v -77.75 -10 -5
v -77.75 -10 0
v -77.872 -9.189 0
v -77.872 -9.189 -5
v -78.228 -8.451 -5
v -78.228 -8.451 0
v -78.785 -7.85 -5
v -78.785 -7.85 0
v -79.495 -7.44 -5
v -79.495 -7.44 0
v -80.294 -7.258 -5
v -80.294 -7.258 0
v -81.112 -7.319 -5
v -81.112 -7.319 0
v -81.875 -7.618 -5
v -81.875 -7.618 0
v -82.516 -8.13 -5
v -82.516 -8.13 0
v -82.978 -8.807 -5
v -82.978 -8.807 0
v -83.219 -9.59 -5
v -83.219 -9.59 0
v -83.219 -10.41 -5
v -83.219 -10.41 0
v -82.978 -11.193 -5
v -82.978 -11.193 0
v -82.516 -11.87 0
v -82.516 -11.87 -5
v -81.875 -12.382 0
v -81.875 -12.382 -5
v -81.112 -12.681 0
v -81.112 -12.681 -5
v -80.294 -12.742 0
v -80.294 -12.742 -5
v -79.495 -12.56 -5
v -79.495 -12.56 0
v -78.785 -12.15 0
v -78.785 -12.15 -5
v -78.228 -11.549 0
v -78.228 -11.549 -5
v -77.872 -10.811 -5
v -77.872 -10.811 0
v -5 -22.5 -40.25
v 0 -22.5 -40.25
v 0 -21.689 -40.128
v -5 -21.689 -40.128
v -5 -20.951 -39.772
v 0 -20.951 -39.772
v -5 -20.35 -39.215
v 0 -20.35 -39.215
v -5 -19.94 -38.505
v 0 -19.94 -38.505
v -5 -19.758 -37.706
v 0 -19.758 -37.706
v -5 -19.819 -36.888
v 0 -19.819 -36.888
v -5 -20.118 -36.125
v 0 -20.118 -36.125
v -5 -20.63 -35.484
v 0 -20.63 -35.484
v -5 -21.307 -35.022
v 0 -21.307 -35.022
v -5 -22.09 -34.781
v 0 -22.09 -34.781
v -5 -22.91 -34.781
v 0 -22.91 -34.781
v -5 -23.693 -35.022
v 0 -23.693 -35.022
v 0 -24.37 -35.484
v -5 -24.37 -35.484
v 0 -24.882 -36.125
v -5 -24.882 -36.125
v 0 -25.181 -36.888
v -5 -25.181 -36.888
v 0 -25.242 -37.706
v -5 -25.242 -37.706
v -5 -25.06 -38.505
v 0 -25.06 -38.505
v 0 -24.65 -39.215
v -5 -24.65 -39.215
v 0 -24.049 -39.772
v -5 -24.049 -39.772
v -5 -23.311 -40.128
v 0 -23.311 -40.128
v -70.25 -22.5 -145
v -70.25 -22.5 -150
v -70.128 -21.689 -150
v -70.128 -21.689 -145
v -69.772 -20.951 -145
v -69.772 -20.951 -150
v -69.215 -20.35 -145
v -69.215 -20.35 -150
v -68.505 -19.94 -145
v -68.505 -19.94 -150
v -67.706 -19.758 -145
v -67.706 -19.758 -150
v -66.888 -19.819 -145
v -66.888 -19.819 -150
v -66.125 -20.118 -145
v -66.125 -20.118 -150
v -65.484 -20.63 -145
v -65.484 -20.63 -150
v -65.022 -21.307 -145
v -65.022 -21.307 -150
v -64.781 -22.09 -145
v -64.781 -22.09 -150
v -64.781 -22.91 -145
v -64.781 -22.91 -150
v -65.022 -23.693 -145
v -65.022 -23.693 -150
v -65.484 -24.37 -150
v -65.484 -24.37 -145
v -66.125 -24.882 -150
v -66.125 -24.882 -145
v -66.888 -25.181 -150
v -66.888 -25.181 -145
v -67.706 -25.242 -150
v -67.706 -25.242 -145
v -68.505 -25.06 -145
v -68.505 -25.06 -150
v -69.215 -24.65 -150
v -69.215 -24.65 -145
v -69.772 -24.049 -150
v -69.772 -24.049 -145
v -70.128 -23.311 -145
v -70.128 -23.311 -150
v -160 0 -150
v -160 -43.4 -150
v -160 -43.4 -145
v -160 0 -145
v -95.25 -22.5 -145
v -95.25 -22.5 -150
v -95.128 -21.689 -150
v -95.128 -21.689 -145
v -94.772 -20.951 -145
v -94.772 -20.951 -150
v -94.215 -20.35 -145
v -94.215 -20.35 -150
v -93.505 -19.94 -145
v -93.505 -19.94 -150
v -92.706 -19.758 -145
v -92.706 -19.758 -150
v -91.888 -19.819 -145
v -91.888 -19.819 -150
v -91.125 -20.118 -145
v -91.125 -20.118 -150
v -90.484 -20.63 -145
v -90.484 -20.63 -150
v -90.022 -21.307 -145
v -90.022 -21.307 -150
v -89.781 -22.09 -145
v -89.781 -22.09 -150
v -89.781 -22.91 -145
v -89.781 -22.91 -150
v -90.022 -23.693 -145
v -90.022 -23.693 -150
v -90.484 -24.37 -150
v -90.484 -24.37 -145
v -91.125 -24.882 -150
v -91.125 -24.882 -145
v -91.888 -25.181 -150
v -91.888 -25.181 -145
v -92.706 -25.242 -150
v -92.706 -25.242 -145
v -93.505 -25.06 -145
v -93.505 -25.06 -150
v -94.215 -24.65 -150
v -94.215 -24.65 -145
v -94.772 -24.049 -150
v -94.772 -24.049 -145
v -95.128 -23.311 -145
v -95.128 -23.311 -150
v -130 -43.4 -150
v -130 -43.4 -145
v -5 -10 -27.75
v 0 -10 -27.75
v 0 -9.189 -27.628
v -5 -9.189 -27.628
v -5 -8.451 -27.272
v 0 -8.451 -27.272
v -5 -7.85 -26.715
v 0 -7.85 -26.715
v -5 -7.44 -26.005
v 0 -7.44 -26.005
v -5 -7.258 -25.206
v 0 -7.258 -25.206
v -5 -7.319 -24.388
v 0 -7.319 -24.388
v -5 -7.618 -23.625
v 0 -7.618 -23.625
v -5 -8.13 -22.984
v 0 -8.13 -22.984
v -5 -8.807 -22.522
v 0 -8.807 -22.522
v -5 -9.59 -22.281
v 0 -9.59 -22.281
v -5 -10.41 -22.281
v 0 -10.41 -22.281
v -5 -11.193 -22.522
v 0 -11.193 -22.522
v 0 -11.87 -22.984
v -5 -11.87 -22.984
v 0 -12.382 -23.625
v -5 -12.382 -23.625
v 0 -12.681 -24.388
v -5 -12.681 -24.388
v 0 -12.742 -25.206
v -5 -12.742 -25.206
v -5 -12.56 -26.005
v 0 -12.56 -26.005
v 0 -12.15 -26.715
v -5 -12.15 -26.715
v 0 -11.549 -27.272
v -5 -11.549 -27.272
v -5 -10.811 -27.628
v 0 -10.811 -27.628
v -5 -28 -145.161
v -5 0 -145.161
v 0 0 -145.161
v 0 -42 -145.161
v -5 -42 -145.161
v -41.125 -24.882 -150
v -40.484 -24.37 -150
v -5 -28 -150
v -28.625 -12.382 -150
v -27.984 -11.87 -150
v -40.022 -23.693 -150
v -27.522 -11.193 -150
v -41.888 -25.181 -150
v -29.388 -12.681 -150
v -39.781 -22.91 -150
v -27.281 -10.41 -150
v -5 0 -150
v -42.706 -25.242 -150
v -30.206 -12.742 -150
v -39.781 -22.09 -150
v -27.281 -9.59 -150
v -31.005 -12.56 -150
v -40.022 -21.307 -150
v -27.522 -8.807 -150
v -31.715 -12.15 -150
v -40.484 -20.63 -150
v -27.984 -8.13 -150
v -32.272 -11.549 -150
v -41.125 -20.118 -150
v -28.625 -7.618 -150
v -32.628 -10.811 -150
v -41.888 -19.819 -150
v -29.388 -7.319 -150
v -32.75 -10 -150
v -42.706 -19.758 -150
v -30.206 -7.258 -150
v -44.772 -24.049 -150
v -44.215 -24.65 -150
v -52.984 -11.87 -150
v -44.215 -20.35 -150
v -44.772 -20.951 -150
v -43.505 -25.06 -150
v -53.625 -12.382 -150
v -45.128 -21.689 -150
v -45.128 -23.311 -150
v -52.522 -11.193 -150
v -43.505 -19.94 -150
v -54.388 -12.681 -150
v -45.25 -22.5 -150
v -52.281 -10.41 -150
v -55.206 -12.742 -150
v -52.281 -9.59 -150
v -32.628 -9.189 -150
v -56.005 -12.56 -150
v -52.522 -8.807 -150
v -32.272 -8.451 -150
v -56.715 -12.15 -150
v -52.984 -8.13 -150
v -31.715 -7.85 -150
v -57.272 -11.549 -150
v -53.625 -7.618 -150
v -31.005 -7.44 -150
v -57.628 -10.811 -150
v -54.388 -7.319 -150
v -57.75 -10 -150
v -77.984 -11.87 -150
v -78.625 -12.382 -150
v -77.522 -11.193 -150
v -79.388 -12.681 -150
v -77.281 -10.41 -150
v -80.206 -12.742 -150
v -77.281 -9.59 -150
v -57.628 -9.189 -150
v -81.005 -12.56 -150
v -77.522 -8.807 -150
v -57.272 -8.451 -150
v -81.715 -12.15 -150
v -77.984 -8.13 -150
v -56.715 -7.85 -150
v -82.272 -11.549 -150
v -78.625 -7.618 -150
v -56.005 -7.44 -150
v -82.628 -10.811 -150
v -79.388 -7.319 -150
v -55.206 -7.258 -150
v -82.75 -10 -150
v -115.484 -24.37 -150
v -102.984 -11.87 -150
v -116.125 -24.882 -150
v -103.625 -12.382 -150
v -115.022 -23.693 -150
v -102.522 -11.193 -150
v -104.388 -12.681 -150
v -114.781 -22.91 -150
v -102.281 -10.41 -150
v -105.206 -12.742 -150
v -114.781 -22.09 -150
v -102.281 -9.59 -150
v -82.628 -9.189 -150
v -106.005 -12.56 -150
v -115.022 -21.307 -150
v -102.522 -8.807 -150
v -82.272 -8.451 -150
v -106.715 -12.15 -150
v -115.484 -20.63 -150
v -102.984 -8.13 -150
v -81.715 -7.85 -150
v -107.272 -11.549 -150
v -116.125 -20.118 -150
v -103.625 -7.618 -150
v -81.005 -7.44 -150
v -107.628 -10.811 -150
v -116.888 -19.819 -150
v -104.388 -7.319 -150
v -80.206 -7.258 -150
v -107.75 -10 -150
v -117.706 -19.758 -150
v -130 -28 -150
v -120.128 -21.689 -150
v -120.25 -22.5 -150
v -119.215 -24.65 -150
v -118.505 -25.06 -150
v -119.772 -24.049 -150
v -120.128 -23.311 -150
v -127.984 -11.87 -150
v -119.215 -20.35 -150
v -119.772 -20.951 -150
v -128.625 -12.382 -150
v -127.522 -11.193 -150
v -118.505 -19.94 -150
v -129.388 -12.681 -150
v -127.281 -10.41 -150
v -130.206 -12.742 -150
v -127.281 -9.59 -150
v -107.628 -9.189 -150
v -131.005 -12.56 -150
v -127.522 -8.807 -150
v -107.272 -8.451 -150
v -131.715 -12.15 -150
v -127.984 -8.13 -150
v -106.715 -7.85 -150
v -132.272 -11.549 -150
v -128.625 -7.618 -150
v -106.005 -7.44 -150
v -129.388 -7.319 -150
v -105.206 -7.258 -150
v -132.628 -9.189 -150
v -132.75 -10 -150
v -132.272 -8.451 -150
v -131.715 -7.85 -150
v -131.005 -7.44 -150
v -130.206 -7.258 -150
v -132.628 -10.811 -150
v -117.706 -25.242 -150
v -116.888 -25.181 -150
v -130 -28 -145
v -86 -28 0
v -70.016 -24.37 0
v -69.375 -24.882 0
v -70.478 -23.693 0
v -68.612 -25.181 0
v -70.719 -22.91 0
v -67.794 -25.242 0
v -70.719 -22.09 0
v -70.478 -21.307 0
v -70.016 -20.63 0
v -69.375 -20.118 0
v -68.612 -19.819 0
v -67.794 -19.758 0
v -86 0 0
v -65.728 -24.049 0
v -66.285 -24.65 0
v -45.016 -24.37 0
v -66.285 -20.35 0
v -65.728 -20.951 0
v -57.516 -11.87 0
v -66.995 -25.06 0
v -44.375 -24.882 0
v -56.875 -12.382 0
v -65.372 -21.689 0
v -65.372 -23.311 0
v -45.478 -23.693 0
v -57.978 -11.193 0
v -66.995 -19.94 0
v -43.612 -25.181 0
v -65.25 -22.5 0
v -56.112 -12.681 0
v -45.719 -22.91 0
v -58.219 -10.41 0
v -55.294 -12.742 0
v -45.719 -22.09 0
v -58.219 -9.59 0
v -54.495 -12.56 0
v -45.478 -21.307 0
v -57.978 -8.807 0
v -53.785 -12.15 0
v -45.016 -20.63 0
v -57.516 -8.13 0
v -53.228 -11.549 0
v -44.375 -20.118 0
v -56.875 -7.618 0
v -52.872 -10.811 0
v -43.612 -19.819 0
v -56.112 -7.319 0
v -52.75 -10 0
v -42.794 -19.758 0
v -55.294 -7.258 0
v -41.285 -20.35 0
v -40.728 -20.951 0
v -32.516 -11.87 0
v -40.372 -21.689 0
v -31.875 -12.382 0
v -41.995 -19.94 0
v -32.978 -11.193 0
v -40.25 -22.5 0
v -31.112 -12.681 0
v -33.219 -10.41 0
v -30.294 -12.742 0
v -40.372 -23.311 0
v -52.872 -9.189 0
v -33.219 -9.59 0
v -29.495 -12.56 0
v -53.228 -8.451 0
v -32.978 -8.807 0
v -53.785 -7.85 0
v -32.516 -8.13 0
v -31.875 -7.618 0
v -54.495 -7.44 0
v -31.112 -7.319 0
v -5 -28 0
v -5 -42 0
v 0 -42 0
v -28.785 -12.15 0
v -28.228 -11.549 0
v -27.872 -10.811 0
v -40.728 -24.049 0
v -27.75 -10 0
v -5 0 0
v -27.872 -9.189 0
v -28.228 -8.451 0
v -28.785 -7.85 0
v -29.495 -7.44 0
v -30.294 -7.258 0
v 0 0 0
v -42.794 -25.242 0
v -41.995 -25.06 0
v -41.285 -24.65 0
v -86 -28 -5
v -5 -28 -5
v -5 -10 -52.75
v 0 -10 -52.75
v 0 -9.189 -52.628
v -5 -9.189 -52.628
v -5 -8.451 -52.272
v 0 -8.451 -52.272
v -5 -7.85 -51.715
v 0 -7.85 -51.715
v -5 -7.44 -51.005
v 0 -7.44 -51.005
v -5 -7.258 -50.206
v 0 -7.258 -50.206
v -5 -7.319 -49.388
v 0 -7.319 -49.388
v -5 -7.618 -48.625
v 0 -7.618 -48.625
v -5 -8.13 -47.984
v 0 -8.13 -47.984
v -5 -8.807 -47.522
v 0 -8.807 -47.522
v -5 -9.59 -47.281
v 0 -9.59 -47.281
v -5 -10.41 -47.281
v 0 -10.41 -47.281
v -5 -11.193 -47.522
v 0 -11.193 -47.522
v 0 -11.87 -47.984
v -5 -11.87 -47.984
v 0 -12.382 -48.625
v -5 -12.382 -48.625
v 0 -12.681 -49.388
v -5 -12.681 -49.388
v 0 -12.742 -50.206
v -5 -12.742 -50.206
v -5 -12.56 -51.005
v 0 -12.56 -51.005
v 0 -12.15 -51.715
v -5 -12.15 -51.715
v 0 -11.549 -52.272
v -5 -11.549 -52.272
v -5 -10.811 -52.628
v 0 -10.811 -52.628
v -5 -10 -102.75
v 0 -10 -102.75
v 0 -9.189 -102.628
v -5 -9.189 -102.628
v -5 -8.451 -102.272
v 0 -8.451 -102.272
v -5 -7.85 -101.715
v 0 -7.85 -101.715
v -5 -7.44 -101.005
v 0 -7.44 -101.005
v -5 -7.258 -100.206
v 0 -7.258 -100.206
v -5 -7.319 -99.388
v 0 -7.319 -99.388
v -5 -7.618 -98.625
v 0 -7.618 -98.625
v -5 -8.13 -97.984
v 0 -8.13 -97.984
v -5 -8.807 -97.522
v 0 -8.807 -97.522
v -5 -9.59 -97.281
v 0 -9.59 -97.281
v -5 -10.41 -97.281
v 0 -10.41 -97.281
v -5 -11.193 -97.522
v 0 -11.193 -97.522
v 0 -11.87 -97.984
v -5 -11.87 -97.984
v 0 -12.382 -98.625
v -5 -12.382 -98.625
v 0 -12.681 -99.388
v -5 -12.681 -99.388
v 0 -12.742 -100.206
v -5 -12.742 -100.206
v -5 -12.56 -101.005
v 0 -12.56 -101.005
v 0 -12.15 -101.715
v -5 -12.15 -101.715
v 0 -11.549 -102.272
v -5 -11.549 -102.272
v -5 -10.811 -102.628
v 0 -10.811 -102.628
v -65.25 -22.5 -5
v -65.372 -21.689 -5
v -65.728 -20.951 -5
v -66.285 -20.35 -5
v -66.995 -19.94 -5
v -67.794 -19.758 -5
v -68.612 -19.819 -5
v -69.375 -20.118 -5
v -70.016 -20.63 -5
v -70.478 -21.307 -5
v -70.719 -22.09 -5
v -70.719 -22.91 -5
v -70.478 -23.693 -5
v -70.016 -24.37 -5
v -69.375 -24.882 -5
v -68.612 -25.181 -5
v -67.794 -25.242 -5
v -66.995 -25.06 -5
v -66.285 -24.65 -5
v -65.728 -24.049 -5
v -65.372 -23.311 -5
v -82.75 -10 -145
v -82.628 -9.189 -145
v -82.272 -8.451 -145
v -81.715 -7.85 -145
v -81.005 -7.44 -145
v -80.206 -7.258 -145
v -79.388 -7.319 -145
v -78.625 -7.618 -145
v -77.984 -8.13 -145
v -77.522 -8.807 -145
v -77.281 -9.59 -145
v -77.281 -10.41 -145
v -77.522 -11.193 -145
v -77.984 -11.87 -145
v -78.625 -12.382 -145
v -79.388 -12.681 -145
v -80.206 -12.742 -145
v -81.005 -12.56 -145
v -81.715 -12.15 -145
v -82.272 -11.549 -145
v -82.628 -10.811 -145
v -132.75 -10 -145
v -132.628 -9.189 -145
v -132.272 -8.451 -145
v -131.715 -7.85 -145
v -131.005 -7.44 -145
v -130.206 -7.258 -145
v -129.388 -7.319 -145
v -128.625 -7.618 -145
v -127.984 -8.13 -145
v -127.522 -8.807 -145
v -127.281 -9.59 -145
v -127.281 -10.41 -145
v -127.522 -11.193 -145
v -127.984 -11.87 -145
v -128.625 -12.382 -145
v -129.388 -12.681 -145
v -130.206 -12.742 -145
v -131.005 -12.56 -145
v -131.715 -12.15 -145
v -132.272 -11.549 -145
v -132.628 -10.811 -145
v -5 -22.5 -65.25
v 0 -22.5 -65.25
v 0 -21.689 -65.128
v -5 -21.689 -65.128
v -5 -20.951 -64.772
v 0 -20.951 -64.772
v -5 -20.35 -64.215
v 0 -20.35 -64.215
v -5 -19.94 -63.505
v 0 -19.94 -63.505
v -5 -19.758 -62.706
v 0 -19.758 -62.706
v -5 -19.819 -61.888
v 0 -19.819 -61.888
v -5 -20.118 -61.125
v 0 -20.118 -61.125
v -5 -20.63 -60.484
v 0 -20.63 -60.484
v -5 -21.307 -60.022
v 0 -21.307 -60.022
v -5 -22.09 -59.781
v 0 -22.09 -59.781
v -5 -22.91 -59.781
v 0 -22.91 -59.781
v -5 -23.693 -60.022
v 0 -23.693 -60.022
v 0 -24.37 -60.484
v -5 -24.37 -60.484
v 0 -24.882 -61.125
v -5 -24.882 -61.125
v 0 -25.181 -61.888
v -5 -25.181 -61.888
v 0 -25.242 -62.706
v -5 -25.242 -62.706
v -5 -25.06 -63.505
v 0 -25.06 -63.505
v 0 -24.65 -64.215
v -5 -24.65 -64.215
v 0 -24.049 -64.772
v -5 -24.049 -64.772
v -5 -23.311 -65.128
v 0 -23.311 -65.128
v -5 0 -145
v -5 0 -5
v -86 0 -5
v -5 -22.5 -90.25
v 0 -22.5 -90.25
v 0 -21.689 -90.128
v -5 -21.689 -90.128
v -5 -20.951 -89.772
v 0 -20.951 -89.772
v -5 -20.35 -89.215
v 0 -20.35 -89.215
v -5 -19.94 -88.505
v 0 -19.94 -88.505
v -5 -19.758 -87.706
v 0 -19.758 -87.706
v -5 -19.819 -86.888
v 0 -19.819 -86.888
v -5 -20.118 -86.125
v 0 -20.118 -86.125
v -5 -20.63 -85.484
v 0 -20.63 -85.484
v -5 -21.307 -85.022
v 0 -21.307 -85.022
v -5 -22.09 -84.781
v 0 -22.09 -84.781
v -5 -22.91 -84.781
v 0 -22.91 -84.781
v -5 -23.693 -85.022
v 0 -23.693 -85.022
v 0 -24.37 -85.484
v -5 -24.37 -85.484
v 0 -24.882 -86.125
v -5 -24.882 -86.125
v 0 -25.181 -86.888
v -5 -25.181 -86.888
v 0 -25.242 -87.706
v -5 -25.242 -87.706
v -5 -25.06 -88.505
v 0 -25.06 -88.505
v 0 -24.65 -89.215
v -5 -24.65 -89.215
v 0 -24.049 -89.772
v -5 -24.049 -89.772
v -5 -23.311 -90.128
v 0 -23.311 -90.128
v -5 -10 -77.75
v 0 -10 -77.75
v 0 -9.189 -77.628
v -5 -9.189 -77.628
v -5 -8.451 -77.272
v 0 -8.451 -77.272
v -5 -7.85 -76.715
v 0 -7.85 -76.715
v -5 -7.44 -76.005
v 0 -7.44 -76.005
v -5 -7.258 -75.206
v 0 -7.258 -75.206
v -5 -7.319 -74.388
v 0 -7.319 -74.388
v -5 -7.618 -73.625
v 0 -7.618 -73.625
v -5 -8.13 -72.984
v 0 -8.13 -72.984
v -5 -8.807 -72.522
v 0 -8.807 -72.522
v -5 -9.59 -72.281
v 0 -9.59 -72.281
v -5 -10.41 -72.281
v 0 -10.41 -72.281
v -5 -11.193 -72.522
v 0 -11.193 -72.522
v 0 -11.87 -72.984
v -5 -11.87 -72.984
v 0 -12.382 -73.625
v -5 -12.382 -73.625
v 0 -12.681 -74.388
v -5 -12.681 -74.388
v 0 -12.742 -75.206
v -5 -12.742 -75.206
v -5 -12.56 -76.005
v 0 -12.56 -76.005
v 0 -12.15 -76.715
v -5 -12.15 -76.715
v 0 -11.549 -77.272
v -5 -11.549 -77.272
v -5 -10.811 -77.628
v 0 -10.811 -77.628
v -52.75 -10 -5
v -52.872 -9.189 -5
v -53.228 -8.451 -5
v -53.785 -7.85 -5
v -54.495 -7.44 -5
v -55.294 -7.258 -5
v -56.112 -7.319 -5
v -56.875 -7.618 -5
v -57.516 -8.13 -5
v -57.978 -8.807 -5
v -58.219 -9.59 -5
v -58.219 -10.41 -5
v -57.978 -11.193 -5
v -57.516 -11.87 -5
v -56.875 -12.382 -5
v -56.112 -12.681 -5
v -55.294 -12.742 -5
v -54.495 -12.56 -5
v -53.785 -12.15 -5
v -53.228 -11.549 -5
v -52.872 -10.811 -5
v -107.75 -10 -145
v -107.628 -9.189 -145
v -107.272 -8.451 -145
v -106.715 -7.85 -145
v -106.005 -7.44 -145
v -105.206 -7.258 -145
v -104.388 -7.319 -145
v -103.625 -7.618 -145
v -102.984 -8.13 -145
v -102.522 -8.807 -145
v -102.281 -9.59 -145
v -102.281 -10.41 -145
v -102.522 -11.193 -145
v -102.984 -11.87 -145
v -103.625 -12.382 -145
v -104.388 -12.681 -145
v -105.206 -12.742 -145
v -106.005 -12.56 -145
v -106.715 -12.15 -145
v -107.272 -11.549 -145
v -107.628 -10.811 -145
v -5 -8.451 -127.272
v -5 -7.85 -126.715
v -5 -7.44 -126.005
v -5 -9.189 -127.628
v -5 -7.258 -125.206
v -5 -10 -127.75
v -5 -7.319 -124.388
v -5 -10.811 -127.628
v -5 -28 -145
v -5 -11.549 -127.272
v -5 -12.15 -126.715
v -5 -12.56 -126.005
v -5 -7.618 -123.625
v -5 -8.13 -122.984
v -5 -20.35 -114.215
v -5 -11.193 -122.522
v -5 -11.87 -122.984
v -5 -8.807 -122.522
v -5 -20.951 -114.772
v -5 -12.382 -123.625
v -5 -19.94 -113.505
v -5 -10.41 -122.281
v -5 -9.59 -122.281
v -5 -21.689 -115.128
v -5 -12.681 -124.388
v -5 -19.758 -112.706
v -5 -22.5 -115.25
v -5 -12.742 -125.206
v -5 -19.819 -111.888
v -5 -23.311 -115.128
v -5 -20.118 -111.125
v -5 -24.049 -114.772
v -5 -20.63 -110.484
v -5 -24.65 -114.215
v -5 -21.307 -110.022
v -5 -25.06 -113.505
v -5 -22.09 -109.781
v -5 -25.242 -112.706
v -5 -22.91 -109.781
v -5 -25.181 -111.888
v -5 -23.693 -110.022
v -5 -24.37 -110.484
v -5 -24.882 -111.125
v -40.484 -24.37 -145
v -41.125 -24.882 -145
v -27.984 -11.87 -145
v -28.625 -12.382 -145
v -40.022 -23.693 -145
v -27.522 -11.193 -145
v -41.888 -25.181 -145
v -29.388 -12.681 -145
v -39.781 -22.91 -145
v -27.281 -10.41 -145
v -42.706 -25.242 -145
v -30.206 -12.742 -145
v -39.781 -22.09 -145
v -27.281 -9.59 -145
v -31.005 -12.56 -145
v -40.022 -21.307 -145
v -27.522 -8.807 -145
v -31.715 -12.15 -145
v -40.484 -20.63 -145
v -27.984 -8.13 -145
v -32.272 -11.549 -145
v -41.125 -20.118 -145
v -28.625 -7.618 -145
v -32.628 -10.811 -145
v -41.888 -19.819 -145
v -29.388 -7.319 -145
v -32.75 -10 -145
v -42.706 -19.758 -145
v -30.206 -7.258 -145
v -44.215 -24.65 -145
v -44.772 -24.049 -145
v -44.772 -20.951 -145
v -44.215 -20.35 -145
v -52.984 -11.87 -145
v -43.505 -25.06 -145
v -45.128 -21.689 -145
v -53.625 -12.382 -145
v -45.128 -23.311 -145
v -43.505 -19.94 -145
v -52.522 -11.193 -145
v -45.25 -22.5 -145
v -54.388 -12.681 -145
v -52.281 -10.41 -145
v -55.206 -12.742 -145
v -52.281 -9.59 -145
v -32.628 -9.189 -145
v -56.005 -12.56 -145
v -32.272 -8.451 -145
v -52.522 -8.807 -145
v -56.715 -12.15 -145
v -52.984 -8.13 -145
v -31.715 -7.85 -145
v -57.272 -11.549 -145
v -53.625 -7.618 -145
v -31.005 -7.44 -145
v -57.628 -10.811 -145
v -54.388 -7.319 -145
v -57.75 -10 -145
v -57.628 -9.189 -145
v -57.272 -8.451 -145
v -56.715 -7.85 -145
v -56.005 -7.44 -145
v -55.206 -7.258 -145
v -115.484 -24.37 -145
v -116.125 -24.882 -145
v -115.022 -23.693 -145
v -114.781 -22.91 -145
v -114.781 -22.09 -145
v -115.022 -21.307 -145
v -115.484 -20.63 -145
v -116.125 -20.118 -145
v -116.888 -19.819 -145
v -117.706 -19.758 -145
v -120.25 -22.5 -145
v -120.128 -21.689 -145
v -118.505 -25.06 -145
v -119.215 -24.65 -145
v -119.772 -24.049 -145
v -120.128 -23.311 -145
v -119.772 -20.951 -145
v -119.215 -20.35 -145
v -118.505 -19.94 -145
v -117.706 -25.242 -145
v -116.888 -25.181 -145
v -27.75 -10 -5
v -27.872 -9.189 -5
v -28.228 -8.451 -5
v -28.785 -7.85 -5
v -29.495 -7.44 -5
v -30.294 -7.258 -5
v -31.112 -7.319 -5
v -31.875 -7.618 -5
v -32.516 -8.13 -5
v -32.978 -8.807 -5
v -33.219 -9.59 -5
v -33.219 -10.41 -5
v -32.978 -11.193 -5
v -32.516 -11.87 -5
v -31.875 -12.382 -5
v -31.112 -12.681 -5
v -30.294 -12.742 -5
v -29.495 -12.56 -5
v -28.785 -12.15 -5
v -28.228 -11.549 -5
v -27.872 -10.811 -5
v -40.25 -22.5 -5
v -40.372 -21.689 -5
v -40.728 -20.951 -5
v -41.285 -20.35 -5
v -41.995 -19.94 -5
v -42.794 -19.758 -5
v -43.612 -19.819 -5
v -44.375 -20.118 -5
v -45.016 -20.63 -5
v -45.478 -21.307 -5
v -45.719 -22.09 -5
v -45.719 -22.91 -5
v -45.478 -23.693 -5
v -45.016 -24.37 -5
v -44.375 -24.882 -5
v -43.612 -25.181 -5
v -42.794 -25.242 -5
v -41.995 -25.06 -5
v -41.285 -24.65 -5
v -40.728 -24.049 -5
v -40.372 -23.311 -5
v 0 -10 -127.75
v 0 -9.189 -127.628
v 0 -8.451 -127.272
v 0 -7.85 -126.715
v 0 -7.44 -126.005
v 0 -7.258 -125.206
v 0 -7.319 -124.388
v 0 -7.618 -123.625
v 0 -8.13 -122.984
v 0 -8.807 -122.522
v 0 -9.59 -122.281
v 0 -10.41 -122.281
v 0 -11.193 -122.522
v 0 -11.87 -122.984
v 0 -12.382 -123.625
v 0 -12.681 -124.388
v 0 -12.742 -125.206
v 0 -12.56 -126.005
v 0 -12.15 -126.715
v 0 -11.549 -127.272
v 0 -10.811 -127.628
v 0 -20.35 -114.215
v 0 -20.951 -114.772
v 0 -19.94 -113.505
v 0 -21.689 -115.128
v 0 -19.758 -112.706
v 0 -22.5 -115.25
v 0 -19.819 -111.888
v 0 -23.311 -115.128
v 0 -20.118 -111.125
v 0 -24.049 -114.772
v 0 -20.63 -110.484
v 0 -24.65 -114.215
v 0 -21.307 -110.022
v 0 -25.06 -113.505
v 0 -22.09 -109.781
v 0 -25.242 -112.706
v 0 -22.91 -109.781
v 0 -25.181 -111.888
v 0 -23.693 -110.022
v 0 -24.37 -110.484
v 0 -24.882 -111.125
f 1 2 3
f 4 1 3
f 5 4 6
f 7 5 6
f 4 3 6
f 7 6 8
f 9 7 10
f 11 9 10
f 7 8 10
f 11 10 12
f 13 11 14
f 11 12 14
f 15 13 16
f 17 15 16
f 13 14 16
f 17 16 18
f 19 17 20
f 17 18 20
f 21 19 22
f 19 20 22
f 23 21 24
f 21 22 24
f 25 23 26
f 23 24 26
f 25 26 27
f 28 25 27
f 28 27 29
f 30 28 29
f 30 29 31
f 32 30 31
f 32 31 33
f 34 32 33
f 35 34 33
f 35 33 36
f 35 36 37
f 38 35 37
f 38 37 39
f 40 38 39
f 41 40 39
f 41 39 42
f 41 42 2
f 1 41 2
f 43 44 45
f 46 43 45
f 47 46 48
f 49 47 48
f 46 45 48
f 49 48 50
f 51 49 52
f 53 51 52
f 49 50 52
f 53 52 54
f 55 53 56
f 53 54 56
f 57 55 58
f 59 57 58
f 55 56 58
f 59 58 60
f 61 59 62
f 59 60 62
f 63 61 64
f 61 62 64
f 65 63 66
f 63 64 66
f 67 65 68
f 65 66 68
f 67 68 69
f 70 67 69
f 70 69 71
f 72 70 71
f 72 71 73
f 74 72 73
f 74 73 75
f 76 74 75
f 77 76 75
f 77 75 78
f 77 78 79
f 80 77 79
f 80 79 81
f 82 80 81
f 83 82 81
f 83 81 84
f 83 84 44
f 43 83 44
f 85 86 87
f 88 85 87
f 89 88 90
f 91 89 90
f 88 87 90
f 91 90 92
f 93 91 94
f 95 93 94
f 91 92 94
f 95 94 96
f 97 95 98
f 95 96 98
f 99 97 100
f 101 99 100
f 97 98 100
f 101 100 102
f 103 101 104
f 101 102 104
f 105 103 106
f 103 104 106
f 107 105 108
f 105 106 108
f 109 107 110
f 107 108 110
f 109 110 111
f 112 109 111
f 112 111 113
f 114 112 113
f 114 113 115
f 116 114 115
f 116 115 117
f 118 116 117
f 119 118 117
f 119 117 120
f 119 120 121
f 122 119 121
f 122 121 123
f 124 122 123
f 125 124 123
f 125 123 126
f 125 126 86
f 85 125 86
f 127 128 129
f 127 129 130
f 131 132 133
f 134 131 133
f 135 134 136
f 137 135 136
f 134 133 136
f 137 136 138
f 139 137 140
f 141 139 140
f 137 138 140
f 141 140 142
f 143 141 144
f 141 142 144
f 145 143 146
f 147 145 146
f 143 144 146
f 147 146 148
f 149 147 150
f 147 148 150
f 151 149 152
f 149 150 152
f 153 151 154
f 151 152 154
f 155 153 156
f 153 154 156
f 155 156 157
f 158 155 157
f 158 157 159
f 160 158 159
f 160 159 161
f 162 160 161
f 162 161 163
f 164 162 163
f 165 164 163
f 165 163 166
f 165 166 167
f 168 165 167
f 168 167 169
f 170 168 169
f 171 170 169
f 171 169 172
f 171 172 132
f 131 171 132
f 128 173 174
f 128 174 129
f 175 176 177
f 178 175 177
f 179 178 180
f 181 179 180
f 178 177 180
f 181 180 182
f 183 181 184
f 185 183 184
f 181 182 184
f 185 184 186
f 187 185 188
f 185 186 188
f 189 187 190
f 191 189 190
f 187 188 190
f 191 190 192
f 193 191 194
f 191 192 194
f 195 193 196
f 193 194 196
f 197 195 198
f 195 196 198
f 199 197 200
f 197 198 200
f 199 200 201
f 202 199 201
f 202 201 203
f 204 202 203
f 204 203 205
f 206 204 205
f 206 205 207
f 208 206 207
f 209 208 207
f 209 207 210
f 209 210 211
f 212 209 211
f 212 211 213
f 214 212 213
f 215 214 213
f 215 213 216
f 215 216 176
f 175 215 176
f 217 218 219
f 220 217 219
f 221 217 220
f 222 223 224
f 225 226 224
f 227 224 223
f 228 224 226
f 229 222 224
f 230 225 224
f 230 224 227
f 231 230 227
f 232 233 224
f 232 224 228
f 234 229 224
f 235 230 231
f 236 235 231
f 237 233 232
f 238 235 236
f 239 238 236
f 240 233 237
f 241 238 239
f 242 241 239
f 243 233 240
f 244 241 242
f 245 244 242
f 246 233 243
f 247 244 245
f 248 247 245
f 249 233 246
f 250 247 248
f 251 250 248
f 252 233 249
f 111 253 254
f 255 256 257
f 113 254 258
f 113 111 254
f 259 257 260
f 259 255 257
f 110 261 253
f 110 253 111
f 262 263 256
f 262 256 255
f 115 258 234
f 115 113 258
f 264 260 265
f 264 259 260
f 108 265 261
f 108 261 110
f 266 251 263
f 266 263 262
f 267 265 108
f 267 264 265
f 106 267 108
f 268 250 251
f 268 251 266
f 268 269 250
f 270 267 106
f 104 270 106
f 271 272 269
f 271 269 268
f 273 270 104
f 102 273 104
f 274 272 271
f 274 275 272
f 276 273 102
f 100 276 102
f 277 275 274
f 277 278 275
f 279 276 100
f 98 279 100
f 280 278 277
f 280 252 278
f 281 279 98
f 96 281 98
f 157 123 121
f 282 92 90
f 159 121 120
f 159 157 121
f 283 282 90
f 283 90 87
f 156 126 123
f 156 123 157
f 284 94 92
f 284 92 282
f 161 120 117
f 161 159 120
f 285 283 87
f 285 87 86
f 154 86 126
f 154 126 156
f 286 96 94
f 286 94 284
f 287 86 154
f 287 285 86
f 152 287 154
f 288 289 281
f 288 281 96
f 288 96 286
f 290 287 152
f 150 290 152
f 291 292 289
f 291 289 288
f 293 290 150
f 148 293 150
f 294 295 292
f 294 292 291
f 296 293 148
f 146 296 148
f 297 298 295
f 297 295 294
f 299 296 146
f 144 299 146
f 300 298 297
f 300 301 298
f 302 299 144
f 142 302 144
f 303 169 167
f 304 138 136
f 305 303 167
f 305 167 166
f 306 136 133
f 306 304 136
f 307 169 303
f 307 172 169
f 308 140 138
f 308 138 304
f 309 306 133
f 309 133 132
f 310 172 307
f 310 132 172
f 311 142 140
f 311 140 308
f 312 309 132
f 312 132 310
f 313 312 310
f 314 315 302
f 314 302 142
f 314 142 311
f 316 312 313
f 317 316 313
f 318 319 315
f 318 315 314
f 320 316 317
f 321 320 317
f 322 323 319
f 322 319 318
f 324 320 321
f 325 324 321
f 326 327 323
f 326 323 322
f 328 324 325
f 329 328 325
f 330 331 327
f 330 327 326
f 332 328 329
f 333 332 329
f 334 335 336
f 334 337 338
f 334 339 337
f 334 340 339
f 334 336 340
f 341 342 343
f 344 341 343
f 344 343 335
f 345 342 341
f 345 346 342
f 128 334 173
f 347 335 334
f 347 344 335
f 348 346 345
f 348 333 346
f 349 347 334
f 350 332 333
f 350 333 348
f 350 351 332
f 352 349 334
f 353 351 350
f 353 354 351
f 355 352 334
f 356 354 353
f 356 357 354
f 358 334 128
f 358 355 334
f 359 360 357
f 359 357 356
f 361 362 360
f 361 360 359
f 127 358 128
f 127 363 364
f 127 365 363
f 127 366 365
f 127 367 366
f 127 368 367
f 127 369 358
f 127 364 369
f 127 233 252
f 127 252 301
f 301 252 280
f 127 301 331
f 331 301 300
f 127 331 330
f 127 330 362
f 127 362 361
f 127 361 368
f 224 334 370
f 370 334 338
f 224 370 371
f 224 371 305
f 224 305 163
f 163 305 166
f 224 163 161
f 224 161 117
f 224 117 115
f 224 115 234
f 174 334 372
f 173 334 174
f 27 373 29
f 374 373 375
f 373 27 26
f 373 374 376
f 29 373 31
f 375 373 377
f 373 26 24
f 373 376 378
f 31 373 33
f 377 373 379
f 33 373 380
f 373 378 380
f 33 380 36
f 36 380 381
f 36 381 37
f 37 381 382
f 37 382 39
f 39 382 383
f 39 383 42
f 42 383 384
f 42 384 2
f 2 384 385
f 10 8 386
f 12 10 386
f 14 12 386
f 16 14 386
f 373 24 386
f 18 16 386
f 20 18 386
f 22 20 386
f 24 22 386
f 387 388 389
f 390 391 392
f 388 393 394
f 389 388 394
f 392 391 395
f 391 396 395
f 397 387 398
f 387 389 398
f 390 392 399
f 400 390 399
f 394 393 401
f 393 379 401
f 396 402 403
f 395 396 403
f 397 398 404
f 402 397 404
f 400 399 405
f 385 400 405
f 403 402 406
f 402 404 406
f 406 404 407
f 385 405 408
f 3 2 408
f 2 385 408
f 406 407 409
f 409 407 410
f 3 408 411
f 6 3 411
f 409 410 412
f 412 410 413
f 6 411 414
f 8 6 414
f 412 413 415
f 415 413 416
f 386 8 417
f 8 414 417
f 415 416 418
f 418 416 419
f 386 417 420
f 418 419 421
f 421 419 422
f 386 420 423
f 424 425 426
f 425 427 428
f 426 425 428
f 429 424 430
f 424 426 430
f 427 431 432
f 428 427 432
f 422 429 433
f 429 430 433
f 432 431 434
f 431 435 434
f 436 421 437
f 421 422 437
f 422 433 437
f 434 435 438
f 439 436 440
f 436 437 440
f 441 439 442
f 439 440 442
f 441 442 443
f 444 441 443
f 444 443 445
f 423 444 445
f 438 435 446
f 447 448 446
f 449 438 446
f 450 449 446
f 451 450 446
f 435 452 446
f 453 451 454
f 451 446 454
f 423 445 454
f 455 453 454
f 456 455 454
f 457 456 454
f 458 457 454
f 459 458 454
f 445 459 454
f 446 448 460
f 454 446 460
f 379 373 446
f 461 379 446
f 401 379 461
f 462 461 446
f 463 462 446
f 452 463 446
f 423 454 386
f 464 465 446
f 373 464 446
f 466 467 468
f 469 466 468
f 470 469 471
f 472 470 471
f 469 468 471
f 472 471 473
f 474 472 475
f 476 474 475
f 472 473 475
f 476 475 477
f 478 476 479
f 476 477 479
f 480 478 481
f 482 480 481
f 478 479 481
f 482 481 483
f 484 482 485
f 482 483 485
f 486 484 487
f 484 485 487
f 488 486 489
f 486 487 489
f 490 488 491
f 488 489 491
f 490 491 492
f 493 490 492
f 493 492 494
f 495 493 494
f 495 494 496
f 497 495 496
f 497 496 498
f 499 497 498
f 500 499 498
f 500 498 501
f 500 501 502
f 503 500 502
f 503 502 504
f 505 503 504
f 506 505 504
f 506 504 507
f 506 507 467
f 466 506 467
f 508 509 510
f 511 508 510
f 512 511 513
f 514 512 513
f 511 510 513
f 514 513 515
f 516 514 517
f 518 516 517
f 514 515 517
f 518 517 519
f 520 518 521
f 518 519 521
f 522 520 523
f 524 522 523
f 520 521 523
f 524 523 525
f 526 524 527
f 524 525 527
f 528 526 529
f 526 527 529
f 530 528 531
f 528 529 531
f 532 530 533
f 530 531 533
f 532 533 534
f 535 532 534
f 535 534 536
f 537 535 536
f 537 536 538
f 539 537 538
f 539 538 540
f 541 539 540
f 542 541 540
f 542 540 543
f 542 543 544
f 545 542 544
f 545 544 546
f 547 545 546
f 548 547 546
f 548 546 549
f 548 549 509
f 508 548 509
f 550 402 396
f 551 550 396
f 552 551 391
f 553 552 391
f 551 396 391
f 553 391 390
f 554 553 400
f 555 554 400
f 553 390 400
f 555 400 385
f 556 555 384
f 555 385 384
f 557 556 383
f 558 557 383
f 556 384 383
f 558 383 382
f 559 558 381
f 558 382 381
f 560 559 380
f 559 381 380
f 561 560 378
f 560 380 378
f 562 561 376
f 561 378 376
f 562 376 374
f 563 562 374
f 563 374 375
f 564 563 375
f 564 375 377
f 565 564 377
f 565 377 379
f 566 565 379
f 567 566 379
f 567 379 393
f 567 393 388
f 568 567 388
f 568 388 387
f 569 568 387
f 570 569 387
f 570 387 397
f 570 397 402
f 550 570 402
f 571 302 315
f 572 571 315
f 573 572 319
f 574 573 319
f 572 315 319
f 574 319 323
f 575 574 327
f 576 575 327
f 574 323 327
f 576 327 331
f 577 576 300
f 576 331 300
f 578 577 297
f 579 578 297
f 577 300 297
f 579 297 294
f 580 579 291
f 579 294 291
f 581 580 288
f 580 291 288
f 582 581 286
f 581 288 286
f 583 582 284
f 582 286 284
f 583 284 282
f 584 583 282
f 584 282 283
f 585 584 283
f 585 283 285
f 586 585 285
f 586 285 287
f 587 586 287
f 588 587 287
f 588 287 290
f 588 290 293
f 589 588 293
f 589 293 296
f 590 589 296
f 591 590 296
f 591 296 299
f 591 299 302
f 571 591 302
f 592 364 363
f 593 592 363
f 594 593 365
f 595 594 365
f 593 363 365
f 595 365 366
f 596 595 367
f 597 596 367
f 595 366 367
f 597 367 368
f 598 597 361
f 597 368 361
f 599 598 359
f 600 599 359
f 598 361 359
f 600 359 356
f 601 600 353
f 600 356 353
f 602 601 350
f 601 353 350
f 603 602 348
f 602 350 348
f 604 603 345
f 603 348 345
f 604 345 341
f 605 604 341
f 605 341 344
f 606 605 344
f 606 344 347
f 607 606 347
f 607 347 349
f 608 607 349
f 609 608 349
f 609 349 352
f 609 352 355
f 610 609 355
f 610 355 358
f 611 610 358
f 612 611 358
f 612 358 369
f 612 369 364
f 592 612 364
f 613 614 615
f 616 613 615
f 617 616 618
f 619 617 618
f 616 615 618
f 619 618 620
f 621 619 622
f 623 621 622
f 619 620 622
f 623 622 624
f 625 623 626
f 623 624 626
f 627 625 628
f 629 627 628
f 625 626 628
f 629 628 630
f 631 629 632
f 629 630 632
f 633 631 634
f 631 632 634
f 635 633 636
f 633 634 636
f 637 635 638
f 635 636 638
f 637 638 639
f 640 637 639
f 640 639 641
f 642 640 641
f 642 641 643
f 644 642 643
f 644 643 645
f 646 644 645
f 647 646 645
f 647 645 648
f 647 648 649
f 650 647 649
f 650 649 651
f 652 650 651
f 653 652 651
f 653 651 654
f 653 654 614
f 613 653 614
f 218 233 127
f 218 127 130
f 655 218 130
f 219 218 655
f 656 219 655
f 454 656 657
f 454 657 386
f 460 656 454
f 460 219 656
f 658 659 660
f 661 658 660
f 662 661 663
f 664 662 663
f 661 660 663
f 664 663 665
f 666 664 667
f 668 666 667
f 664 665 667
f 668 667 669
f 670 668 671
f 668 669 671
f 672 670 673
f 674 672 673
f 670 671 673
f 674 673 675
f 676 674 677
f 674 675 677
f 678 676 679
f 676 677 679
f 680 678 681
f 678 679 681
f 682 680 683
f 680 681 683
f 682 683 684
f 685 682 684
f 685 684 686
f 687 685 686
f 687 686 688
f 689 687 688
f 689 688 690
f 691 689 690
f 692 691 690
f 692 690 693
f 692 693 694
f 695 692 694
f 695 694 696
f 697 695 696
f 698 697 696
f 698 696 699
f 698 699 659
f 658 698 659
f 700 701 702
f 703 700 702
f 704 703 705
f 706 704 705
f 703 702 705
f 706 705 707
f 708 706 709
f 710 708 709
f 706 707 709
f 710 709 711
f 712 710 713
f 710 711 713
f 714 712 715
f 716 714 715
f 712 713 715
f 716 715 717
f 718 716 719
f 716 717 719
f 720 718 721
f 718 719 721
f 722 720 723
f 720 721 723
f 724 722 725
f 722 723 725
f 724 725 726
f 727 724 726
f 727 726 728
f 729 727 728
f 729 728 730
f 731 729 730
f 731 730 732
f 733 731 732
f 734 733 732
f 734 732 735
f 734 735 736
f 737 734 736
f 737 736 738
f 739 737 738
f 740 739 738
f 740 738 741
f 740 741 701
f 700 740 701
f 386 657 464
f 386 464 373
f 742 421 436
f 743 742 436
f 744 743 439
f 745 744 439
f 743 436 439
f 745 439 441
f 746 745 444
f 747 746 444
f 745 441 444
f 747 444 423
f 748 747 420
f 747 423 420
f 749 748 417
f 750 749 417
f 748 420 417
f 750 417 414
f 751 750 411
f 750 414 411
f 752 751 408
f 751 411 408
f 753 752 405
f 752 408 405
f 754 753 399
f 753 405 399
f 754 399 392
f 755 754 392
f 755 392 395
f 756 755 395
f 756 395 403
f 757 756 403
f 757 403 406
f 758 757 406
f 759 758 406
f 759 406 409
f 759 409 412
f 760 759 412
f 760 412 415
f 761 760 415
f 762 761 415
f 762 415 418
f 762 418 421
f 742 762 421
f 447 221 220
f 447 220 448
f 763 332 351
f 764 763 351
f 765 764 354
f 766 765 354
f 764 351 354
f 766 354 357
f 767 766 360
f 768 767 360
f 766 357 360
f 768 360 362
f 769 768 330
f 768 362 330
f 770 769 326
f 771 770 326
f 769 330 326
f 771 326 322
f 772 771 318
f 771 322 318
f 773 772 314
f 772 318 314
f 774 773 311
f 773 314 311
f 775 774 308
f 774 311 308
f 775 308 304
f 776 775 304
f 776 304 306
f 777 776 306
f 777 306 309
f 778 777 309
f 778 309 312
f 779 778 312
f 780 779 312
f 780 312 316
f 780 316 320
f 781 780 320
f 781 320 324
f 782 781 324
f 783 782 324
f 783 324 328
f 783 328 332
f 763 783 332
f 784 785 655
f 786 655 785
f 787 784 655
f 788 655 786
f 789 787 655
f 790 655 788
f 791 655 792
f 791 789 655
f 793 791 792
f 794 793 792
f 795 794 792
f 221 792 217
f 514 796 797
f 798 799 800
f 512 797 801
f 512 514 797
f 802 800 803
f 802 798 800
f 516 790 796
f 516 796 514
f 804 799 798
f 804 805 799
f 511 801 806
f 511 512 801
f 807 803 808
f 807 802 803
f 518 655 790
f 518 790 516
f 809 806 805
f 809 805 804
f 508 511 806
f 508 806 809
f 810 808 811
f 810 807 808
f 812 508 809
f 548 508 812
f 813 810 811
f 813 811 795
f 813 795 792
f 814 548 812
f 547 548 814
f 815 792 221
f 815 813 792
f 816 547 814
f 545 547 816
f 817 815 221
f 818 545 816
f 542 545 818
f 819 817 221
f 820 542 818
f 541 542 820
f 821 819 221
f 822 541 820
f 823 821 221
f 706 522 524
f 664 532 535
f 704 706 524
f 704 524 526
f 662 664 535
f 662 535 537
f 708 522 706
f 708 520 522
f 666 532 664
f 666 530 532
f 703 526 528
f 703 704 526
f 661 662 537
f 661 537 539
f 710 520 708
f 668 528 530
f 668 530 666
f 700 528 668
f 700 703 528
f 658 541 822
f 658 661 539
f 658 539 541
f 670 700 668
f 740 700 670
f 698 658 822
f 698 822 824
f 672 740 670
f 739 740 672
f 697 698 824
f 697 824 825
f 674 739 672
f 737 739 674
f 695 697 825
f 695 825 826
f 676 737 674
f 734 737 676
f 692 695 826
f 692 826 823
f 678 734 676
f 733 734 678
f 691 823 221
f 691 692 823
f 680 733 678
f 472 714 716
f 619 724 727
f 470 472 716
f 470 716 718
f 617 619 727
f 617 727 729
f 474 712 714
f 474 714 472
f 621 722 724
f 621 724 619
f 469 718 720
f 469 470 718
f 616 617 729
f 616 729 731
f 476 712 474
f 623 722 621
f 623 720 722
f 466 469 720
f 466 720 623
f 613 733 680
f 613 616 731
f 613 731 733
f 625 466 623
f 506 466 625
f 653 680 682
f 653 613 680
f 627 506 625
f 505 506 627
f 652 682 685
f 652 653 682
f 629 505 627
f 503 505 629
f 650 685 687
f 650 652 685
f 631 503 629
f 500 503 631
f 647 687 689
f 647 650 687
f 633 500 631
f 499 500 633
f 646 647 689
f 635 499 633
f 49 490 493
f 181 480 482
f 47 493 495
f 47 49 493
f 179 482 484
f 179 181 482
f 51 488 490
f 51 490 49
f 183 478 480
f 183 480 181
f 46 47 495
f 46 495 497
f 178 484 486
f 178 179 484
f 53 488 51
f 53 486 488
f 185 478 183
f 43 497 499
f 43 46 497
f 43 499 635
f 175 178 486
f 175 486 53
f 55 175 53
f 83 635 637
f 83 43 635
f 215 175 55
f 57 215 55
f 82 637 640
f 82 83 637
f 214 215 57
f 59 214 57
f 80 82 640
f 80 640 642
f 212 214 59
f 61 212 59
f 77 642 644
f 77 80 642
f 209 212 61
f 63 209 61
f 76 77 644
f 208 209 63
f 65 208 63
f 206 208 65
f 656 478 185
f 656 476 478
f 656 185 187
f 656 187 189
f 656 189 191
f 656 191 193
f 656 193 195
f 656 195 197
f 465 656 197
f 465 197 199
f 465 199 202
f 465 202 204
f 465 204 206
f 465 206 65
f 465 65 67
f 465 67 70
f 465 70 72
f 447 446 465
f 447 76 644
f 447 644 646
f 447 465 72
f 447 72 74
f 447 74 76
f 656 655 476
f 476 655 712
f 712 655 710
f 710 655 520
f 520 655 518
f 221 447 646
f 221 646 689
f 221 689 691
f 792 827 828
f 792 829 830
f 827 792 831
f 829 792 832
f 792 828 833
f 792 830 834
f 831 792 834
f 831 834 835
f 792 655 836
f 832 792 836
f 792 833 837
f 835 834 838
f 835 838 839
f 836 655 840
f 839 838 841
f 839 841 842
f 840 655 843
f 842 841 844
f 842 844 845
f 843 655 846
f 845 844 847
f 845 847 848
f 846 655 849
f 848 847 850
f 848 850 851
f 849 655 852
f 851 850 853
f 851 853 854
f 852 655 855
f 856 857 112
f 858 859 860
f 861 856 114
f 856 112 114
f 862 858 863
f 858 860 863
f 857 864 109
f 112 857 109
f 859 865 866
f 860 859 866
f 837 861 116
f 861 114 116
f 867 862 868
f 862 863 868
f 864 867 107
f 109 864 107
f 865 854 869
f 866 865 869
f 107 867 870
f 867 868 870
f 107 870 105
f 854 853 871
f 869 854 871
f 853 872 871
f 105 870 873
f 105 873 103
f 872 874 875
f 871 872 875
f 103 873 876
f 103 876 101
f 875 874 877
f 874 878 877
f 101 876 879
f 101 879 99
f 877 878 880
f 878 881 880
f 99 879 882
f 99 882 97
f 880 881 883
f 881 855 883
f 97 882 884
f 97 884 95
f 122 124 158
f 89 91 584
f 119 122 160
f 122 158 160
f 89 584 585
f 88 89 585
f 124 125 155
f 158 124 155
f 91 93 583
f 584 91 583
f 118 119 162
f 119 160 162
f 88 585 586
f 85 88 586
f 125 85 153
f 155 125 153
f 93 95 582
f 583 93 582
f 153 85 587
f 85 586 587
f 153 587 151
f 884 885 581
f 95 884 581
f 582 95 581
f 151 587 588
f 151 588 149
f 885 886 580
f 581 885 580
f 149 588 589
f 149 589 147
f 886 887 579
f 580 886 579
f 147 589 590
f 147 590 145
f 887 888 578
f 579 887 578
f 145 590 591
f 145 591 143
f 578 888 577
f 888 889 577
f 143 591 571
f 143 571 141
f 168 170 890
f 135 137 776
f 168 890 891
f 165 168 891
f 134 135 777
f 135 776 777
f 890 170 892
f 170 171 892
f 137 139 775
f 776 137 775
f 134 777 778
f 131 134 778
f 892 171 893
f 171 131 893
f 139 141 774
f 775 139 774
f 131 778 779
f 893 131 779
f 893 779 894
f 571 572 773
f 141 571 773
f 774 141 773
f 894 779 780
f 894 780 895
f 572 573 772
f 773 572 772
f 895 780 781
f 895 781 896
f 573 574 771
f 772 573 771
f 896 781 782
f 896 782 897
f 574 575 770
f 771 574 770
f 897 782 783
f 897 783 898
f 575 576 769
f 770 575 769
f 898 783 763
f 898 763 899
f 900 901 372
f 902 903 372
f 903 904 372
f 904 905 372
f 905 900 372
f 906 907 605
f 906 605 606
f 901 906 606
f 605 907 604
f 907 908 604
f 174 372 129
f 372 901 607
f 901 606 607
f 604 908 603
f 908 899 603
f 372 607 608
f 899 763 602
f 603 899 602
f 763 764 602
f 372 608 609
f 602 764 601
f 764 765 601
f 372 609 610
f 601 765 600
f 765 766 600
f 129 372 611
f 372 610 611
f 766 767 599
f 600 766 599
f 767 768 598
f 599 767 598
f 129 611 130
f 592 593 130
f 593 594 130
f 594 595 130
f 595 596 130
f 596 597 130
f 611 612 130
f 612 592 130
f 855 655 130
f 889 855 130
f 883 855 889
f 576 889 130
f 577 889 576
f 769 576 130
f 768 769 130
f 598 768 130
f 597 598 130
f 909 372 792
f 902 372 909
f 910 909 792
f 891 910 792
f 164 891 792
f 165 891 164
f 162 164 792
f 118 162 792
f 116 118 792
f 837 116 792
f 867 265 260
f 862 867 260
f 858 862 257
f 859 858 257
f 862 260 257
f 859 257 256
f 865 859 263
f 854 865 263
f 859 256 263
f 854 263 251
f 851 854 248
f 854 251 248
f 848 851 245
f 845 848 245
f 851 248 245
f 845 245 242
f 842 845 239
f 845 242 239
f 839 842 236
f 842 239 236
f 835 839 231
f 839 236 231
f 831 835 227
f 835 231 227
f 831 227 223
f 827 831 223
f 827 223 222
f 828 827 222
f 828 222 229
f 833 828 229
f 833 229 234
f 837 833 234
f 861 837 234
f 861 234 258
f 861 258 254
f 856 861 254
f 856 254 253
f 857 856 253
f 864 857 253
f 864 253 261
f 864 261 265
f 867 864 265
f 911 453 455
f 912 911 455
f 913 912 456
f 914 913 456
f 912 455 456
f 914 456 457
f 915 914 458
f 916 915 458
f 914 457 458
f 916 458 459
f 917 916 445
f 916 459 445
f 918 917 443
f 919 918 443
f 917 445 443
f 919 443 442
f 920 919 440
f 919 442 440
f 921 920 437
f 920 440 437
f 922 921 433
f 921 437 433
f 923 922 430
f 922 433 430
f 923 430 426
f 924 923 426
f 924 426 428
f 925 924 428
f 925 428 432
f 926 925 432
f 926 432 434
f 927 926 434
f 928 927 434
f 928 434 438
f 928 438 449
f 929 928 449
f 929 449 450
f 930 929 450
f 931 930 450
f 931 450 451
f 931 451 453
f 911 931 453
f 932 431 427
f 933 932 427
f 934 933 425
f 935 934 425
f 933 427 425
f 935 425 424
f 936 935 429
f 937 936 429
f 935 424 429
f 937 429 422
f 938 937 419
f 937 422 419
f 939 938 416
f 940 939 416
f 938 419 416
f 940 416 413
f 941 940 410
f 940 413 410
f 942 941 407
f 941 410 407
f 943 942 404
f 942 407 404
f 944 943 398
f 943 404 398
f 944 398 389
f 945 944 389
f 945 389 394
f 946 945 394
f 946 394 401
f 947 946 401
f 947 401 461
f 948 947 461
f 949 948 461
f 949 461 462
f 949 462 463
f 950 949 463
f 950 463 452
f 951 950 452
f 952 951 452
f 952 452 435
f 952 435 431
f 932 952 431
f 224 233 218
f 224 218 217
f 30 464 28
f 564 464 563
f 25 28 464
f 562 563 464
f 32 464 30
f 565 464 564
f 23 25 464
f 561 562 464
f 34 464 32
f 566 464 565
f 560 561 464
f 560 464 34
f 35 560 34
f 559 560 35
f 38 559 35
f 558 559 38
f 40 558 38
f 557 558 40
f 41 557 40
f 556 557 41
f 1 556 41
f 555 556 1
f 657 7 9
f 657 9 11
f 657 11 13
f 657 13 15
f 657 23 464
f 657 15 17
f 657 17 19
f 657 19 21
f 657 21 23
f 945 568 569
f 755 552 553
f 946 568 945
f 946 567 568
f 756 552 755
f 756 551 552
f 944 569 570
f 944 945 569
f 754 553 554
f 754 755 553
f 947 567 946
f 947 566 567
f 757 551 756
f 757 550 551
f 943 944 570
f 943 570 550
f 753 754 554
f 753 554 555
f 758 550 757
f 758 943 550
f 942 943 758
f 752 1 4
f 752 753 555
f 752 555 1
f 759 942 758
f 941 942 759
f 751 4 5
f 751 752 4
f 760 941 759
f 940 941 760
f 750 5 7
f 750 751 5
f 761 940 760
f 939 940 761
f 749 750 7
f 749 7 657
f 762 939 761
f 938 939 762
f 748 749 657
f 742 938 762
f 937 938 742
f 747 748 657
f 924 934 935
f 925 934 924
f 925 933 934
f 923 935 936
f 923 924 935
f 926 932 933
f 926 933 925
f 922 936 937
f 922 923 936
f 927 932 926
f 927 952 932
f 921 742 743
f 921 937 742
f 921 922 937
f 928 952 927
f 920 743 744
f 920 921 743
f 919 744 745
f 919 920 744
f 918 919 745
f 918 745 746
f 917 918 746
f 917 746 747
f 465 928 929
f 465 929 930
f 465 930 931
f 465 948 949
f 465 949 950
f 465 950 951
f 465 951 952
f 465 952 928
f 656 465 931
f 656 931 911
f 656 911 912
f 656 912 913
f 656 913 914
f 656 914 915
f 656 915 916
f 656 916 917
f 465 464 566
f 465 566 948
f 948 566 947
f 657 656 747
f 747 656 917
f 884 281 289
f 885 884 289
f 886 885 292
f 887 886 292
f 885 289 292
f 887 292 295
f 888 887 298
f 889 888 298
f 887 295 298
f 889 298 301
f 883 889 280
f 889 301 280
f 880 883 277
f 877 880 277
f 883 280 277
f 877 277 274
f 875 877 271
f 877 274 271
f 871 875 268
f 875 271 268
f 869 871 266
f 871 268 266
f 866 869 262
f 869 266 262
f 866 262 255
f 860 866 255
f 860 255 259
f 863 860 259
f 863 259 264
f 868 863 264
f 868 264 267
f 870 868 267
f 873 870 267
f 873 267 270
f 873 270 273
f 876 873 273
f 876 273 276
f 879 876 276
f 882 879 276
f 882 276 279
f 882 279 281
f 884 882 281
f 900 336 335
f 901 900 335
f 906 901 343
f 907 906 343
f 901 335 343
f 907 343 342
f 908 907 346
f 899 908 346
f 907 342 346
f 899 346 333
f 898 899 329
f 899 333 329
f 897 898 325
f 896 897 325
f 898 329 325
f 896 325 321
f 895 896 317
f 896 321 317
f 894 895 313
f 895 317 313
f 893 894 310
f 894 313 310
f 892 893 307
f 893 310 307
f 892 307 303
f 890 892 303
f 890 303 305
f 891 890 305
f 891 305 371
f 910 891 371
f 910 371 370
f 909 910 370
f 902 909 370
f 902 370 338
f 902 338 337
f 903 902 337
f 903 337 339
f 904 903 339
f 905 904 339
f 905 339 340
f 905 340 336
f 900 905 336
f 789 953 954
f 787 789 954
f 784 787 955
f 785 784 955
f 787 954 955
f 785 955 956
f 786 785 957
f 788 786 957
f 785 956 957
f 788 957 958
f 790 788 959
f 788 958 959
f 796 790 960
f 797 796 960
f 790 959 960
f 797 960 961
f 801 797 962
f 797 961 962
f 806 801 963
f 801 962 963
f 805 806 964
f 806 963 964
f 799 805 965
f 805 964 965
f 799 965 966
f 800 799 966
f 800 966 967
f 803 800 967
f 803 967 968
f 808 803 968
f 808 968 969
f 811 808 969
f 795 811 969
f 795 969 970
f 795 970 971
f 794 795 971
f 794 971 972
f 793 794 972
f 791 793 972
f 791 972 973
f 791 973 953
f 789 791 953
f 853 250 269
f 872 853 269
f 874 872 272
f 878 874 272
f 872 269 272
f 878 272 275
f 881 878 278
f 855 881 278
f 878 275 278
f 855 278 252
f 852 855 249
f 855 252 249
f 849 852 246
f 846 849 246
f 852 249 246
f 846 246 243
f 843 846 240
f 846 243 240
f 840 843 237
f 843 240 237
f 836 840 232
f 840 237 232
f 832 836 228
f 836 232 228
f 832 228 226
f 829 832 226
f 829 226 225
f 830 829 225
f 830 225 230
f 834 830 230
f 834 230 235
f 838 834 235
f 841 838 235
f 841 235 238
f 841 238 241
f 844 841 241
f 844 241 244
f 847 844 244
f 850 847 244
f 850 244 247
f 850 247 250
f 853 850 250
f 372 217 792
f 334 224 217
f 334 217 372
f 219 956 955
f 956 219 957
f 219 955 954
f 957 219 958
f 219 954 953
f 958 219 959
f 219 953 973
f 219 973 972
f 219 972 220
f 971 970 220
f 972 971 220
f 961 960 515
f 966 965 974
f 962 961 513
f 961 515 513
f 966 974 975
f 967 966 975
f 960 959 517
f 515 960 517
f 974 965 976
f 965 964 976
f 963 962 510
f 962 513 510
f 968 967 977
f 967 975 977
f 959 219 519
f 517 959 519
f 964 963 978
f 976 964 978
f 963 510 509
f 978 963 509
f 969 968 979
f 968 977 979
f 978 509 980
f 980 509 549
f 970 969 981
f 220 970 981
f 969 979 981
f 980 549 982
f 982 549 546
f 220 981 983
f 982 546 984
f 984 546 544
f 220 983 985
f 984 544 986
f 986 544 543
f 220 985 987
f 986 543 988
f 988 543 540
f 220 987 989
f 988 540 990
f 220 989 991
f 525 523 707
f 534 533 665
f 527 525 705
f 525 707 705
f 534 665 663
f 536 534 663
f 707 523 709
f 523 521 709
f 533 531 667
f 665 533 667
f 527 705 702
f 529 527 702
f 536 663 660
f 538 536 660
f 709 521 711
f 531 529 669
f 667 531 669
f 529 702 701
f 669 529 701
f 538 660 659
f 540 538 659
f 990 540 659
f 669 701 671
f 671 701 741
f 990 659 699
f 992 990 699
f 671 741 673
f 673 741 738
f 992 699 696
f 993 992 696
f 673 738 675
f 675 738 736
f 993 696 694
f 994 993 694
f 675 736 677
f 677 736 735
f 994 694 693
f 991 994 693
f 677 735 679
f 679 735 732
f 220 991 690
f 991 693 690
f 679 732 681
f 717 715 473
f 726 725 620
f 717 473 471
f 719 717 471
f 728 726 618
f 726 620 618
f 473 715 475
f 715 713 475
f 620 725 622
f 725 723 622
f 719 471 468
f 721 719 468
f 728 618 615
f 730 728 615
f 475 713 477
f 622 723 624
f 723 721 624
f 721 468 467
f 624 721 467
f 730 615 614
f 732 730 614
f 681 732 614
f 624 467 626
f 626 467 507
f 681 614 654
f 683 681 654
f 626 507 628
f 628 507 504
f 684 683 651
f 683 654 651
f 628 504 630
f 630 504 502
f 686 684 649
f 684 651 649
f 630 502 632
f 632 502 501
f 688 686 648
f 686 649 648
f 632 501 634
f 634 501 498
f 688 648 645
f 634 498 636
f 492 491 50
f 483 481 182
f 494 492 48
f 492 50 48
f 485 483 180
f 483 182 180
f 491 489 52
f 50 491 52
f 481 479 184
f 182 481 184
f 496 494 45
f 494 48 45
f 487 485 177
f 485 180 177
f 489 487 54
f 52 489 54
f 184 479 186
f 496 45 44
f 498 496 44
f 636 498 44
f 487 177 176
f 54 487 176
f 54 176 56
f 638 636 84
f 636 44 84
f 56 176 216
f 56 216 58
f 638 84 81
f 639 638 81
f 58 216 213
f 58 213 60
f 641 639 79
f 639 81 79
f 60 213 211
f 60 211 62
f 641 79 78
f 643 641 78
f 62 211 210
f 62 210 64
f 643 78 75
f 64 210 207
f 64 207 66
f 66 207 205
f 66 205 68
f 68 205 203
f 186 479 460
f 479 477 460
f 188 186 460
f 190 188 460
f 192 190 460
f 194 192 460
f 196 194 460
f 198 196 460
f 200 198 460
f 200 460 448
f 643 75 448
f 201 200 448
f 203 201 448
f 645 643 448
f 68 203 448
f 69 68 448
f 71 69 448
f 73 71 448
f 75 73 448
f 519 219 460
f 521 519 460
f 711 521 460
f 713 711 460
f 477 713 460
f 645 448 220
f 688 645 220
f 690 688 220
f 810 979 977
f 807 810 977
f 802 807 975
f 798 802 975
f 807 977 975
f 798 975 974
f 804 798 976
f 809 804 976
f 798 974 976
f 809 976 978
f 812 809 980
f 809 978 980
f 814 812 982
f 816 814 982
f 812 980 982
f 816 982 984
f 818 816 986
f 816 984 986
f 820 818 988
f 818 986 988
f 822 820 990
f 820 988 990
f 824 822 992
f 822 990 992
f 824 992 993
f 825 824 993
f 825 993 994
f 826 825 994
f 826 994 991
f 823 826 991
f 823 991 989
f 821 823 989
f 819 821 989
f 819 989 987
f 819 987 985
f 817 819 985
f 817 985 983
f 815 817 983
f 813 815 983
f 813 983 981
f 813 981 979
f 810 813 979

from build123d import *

# Parameters (mm, degrees)
SKETCH1_W                      = 42
SKETCH1_H                      = 145.161285219
BOSS_EXTRUDE1_DEPTH            = 5
BOSS_EXTRUDE2_DEPTH            = 5
SKETCH3_W                      = 5
SKETCH3_H                      = 27.999999523
BOSS_EXTRUDE3_DEPTH            = 81.000003815
F_5_5_5_5_DIAMETER_HOLE1_D     = 5.5
F_5_5_5_5_DIAMETER_HOLE2_D     = 5.5
F_5_5_5_5_DIAMETER_HOLE2_DEPTH = 5
F_5_5_5_5_DIAMETER_HOLE3_D     = 5.5
F_5_5_5_5_DIAMETER_HOLE3_DEPTH = 5


with BuildPart() as part:
    # Sketch1 → Boss-Extrude1 (new body)
    with BuildSketch(Plane(origin=(-5, 0, 0), x_dir=(0, -1, 0), z_dir=(-1, 0, 0))):
        with Locations((21, -72.58064261)):
            Rectangle(SKETCH1_W, SKETCH1_H)
    extrude(amount=-BOSS_EXTRUDE1_DEPTH)

    # Sketch2 → Boss-Extrude2 (add)
    with BuildSketch(Plane(origin=(0, 0, -150), x_dir=(-1, 0, 0), z_dir=(0, 0, -1))):
        Polygon((130, -43.400001526), (160, -43.400001526), (160, 0), (5, 0), (5, -27.999999523), (130, -27.999999523), align=None)
    extrude(amount=-BOSS_EXTRUDE2_DEPTH)

    # Sketch3 → Boss-Extrude3 (add)
    with BuildSketch(Plane.ZY.offset(5)):
        with Locations((-2.5, -13.999999762)):
            Rectangle(SKETCH3_W, SKETCH3_H)
    extrude(amount=BOSS_EXTRUDE3_DEPTH)

    # Ø5.5 (5.5) Diameter Hole1 (through all)
    with Locations(Plane.ZY.offset(5)):
        with Locations((-37.500000596, -22.500000199), (-25.000000199, -9.99999995), (-50.000000795, -9.99999995), (-62.500000795, -22.500000199), (-75.000000795, -9.99999995), (-87.500000795, -22.500000199), (-112.500000795, -22.500000199), (-100.000000795, -9.99999995), (-125.000000795, -9.99999995)):
            Hole(F_5_5_5_5_DIAMETER_HOLE1_D / 2)

    # Ø5.5 (5.5) Diameter Hole2
    with Locations(Plane.XY.offset(-145)):
        with Locations((-30.000000199, -9.99999995), (-42.500000397, -22.500000199), (-67.500000795, -22.500000199), (-55.000000795, -9.99999995), (-80.000001192, -9.99999995), (-92.500000795, -22.500000199), (-117.500000795, -22.500000199), (-105.000000795, -9.99999995), (-130.000003179, -9.99999995)):
            Hole(F_5_5_5_5_DIAMETER_HOLE2_D / 2, depth=F_5_5_5_5_DIAMETER_HOLE2_DEPTH)

    # Ø5.5 (5.5) Diameter Hole3
    with Locations(Plane(origin=(0, 0, -5), x_dir=(-1, 0, 0), z_dir=(0, 0, -1))):
        with Locations((80.50000151, -9.99999995), (68.000001113, -22.500000199), (43.000001113, -22.500000199), (55.500001113, -9.99999995), (30.500000119, -9.99999995)):
            Hole(F_5_5_5_5_DIAMETER_HOLE3_D / 2, depth=F_5_5_5_5_DIAMETER_HOLE3_DEPTH)


solid = part.part
